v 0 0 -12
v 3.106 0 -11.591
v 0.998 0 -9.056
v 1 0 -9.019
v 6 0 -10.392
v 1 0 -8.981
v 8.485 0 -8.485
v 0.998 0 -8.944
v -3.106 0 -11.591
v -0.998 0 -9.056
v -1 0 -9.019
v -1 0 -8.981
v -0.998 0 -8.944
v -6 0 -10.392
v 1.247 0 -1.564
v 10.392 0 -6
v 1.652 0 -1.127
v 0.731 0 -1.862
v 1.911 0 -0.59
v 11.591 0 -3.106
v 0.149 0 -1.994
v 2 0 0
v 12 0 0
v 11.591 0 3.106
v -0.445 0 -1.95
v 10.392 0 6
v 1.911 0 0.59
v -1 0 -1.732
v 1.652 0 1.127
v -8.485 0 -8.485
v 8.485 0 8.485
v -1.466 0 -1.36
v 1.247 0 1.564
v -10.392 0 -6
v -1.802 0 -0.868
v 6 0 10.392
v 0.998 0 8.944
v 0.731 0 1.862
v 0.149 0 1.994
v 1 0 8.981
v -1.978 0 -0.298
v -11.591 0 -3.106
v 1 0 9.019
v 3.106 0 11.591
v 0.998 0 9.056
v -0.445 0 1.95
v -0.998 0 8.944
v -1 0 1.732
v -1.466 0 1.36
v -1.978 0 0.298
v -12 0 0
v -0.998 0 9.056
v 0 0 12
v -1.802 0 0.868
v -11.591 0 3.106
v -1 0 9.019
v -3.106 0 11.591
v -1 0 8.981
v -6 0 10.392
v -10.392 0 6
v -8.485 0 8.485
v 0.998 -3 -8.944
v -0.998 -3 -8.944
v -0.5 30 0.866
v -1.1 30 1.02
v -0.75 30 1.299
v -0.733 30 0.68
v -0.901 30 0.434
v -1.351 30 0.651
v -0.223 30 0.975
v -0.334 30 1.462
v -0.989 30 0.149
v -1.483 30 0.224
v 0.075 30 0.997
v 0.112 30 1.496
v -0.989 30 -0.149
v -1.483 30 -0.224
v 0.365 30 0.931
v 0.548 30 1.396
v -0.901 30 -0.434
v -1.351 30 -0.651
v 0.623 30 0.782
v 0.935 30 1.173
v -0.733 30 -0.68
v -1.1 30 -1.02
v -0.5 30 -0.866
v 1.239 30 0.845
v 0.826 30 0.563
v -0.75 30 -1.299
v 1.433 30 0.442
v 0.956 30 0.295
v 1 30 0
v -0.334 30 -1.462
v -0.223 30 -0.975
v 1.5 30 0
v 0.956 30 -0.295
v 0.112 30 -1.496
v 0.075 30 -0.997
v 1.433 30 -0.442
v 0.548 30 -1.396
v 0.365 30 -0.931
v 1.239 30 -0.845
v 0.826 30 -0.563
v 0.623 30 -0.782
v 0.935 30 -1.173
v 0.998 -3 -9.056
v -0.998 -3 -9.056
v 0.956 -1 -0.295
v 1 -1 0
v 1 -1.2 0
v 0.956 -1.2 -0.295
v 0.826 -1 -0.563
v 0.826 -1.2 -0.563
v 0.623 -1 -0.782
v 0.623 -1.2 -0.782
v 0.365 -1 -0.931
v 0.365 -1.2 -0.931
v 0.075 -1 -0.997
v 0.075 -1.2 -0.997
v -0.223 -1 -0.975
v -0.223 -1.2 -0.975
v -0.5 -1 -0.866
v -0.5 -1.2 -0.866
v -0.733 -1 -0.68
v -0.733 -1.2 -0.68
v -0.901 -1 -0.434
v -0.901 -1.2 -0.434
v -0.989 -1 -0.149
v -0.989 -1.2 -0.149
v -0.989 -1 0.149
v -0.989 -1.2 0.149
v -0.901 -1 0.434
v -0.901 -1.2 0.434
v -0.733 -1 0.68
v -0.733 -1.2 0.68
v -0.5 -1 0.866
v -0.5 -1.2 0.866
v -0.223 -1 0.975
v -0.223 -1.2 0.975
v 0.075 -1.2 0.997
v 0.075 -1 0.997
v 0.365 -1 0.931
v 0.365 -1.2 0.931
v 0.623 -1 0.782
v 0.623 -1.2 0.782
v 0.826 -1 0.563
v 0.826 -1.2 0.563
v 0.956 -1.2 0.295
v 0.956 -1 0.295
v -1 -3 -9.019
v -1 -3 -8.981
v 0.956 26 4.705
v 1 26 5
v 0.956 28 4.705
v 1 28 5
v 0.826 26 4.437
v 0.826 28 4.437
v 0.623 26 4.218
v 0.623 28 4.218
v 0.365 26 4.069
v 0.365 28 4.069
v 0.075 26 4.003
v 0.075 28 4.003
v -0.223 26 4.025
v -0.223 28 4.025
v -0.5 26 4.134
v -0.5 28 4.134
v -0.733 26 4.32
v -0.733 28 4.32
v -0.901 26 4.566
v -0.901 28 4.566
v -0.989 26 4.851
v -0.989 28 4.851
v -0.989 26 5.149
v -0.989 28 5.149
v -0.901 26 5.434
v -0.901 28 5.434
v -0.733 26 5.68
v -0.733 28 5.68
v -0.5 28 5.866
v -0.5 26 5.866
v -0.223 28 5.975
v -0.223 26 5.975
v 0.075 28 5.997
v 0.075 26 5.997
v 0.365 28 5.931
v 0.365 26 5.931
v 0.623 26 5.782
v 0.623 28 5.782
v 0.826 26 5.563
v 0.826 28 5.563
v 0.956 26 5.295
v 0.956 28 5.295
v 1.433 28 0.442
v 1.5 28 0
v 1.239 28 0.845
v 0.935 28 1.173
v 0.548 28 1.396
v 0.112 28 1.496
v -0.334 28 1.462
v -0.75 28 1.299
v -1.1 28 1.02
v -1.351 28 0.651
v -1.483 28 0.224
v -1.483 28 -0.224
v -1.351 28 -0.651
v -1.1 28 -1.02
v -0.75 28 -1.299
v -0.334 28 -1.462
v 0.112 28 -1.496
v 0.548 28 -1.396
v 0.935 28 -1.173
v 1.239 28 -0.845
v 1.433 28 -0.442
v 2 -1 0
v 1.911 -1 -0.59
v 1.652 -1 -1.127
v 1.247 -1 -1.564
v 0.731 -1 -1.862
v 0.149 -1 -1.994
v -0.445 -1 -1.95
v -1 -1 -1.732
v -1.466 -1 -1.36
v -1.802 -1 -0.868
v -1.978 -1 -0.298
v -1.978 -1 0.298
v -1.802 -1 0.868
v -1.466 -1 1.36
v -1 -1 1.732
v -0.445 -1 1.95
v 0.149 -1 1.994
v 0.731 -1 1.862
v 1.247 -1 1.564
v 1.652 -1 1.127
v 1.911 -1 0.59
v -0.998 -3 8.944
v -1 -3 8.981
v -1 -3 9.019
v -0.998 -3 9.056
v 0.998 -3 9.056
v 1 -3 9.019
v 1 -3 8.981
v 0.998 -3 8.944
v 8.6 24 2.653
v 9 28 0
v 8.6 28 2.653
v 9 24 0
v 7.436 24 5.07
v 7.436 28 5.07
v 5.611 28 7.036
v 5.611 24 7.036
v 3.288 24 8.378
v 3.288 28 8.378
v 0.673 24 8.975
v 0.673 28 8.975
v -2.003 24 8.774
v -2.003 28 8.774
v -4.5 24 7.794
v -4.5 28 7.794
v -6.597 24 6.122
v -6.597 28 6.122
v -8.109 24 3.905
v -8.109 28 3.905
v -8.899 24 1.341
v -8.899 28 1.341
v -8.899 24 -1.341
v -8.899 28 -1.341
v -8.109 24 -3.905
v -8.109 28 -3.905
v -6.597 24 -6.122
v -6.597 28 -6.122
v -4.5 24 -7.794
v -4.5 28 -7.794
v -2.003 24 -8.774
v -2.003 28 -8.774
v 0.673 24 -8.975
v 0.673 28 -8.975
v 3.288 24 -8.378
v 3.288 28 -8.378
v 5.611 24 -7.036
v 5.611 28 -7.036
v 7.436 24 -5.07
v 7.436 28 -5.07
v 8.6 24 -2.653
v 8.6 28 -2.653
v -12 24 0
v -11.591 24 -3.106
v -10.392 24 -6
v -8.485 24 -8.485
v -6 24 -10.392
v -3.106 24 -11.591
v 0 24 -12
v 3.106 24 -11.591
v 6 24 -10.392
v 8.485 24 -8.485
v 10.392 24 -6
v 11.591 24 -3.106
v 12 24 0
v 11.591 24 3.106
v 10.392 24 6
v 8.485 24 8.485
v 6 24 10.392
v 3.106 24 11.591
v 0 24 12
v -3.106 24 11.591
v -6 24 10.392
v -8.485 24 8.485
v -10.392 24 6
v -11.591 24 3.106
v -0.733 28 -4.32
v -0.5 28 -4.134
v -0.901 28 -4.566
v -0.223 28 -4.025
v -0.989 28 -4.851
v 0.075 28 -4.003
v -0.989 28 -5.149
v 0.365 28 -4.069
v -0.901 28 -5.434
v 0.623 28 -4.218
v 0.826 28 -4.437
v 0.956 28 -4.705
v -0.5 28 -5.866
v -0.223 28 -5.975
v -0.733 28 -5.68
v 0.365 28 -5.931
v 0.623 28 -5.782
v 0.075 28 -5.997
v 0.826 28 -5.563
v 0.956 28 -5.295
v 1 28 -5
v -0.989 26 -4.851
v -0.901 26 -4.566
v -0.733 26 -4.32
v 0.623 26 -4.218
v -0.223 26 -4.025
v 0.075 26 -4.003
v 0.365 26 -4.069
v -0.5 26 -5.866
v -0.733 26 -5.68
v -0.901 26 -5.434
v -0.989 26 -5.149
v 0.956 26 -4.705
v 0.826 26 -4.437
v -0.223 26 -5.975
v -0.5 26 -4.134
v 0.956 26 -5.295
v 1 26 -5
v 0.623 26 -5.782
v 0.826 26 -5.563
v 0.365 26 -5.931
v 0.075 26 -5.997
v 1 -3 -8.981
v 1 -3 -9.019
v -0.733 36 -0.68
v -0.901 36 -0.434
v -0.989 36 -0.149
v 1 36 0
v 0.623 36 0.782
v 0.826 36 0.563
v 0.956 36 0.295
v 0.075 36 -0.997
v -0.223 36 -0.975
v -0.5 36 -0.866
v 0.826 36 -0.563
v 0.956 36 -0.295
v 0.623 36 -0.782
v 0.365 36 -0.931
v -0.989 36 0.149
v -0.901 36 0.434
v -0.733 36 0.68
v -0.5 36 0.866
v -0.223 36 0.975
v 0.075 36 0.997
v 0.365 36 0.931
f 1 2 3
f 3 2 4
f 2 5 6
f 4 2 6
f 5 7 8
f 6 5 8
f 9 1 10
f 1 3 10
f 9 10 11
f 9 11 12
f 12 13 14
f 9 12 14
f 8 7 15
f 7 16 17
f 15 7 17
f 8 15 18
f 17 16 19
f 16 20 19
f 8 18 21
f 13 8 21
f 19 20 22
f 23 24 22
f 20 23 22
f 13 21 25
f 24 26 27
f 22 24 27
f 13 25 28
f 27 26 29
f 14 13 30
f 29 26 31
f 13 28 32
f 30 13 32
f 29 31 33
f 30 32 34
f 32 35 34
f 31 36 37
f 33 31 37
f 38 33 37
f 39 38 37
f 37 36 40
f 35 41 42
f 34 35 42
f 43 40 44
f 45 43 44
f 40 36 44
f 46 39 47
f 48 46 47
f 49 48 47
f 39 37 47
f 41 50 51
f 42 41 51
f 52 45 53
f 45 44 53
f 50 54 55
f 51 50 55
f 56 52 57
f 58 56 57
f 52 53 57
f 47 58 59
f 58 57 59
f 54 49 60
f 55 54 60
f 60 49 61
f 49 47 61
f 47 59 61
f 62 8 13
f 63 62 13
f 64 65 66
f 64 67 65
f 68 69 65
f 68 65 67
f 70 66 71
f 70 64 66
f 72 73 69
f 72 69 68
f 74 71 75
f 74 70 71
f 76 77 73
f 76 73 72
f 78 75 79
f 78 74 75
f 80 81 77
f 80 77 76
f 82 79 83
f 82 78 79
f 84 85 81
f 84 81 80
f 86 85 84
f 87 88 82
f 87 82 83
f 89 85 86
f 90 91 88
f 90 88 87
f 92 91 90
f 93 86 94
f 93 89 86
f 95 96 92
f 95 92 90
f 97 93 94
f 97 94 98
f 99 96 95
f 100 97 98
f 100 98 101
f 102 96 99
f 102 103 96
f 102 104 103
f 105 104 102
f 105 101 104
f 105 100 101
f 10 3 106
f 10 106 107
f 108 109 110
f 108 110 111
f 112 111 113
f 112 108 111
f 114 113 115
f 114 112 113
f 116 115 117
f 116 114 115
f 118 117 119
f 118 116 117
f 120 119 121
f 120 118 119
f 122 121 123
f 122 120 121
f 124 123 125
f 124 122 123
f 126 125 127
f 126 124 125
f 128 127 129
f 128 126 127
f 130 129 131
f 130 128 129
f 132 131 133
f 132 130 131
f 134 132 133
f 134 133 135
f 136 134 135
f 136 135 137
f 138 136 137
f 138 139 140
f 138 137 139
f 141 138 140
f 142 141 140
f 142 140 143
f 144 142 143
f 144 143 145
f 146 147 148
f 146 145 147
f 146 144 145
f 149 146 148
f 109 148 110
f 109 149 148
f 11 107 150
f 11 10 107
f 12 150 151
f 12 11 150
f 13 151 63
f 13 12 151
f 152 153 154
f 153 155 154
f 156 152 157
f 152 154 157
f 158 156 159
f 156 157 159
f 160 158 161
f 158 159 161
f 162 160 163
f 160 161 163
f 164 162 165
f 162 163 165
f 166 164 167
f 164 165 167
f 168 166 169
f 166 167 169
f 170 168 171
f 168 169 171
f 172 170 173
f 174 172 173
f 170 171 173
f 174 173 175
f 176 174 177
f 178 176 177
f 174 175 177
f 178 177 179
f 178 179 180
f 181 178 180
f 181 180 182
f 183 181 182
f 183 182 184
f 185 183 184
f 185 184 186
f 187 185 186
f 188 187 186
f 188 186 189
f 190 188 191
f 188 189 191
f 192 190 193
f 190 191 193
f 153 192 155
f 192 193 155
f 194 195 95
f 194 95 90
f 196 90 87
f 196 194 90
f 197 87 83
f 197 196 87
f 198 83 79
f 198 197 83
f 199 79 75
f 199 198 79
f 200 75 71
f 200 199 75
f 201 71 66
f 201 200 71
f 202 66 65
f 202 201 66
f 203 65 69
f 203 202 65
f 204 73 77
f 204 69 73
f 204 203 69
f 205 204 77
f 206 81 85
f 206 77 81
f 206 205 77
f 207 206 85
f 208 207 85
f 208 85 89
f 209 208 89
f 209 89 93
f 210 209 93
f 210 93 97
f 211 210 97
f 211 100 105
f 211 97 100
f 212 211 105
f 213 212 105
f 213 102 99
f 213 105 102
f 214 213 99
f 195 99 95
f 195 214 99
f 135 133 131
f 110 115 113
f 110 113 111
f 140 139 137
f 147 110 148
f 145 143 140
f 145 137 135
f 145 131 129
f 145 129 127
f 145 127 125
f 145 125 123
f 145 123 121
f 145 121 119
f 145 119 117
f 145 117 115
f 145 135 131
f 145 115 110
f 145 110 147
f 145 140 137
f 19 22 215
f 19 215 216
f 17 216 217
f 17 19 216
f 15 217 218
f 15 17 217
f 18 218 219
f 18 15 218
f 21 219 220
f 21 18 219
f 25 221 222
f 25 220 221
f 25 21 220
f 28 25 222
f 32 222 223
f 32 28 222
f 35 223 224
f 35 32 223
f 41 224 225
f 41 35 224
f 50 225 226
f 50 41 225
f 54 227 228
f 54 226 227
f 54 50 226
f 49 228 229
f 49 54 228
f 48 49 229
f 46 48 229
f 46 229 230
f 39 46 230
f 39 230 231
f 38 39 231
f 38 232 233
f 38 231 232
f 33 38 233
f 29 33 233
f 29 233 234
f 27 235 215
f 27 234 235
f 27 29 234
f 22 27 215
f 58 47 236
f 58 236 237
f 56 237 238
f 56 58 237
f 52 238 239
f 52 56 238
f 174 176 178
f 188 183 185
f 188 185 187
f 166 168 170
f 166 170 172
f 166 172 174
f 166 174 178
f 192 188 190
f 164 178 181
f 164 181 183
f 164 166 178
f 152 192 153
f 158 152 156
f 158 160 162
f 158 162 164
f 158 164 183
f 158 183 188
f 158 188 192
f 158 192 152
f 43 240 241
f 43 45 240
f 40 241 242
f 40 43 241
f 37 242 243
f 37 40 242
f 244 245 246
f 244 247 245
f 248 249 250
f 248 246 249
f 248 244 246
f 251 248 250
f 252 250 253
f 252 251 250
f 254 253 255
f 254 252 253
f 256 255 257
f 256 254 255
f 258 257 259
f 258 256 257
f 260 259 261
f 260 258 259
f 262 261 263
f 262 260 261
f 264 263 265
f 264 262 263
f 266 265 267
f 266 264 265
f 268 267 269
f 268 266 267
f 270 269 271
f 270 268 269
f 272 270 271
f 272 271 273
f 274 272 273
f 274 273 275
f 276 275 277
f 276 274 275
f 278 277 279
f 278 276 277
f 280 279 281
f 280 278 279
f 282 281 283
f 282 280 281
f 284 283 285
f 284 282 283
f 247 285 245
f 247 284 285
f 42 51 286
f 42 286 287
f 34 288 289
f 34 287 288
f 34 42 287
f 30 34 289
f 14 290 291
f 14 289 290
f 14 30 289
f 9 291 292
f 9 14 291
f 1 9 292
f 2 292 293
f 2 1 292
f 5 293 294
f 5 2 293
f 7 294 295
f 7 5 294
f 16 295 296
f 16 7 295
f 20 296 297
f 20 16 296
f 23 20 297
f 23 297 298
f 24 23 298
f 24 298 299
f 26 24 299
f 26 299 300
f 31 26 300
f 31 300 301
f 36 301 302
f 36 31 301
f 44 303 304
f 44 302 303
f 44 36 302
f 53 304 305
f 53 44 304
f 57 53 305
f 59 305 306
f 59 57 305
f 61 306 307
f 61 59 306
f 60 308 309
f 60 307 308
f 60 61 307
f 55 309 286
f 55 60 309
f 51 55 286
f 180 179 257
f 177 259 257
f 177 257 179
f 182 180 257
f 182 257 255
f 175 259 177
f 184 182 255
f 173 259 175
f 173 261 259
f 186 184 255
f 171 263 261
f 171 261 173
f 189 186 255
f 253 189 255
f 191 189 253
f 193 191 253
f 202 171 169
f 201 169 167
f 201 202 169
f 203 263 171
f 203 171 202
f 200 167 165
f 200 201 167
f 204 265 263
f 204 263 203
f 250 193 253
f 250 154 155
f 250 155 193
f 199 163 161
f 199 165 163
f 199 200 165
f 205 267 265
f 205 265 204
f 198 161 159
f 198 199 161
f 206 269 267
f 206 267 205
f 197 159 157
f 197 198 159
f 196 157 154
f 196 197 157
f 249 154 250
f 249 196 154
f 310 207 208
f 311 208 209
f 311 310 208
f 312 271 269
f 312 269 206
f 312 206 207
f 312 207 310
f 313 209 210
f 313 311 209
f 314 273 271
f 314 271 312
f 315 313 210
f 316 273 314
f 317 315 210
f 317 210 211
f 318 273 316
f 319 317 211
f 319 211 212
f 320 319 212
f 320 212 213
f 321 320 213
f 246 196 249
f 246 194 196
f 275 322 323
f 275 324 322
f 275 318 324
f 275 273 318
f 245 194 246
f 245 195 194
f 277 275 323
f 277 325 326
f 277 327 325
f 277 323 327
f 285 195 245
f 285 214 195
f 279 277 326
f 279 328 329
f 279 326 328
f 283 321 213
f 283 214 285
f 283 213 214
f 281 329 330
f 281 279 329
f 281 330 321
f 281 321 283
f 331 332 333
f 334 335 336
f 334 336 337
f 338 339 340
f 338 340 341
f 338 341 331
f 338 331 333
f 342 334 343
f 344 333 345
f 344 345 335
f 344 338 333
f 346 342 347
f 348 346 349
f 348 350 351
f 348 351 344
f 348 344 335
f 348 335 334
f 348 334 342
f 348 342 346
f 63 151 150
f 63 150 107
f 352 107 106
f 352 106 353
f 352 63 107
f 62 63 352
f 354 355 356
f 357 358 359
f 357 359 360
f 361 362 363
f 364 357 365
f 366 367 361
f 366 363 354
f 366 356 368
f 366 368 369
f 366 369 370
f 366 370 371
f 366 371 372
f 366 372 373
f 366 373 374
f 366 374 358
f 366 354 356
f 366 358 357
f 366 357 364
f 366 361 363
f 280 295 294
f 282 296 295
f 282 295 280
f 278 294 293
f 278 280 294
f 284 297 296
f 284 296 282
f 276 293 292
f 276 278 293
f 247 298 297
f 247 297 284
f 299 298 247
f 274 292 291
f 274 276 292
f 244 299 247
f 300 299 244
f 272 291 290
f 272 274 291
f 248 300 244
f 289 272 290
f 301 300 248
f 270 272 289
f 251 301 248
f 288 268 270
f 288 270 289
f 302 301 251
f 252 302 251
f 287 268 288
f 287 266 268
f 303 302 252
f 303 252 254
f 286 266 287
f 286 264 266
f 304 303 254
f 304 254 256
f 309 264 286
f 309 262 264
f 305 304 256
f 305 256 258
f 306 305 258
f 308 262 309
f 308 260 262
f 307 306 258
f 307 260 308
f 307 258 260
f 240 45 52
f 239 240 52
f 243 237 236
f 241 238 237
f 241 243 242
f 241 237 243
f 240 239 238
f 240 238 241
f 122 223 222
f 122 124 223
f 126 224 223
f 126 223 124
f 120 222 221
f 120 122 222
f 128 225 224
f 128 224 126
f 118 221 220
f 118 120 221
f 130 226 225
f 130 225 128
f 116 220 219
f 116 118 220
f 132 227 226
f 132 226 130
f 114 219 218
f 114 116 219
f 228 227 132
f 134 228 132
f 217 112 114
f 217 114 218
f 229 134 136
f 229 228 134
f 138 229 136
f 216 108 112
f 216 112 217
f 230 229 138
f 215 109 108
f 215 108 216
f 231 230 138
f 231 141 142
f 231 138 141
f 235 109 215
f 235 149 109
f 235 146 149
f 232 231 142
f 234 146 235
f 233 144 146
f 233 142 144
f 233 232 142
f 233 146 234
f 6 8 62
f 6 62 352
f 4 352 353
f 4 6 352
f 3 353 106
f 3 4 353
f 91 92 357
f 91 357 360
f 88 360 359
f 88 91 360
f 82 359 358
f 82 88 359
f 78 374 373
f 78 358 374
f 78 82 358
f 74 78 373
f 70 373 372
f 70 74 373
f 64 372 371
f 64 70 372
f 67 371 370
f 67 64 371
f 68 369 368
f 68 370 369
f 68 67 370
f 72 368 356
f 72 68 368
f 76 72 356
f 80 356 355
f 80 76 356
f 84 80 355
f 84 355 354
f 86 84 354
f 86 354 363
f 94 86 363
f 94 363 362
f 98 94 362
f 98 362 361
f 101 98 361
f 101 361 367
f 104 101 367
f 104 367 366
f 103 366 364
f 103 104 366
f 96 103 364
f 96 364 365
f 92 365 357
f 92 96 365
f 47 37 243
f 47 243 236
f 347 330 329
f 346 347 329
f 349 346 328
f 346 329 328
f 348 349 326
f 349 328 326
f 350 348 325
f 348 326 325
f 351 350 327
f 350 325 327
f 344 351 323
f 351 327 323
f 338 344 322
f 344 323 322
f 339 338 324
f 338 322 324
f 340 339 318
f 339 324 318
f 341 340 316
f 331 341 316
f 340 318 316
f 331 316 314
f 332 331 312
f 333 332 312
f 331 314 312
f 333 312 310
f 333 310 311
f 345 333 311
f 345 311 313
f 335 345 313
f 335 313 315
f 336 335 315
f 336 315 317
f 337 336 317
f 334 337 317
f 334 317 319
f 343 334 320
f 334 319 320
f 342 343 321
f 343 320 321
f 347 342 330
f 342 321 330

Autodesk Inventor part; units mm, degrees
ref_plane "YZ Plane" through (0, 0, 0) normal (1, 0, 0) x (0, 1, 0)
ref_plane "XZ Plane" through (0, 0, 0) normal (0, 1, 0) x (-1, 0, 0)
ref_plane "XY Plane" through (0, 0, 0) normal (0, 0, 1) x (1, 0, 0)
sketch "Sketch1" plane through (0, 0, 0) normal (0, 1, 0) x (-1, 0, 0)
  circle A0 centre (0, 0) radius 12
  dimension "d0" = 24
extrude "Extrusion1" add sketch "Sketch1" along normal blind 24
sketch "Sketch2" plane through (0, 24, 0) normal (0, 1, 0) x (1, 0, 0)
  circle A0 centre (0, 0) radius 9
  dimension "d3" = 18
extrude "Extrusion2" add sketch "Sketch2" along normal blind 4
sketch "Sketch3" plane through (0, 28, 0) normal (0, 1, 0) x (1, 0, 0)
  circle A0 centre (0, 0) radius 1
  circle A1 centre (0, 0) radius 1.5
  dimension "d6" = 2
  dimension "d7" = 3
extrude "Extrusion3" add sketch "Sketch3" along normal blind 2
sketch "Sketch4" plane through (0, 28, 0) normal (0, 1, 0) x (1, 0, 0)
  circle A0 centre (0, 0) radius 1
extrude "Extrusion4" add sketch "Sketch4" along normal blind 8
sketch "Sketch5" plane through (0, 0, 0) normal (0, -1, 0) x (1, 0, 0)
  circle A0 centre (0, 0) radius 9 projected
  circle A1 centre (0, 9) radius 1
  circle A2 centre (0, -9) radius 1
  line L0 (0.9985, 8.9444) -> (-0.9985, 8.9444)
  line L1 (0.9985, 9.0556) -> (-0.9985, 9.0556)
  line L2 (0.9985, -8.9444) -> (-0.9985, -8.9444)
  line L3 (0.9985, -9.0556) -> (-0.9985, -9.0556)
  dimension "d12" = 2
  dimension "d13" = 2
extrude "Extrusion5" add sketch "Sketch5" along normal blind 3 contours L0 A0 | A0 A1 L1 | A2 L3 A0 | A0 L2
sketch "Sketch6" plane through (0, 0, 0) normal (0, -1, 0) x (1, 0, 0)
  circle A0 centre (0, 0) radius 1.5 projected
  circle A1 centre (0, 0) radius 2
  dimension "d16" = 4
extrude "Extrusion6" add sketch "Sketch6" along normal blind 1 contours A0 | A1
sketch "Sketch7" plane through (0, -1, 0) normal (0, -1, 0) x (1, 0, 0)
  circle A0 centre (0, 0) radius 1
  dimension "d19" = 2
extrude "Extrusion7" add sketch "Sketch7" along normal blind 0.2
sketch "Sketch8" plane through (0, 28, 0) normal (0, 1, 0) x (1, 0, 0)
  circle A0 centre (0, 5) radius 1
  circle A1 centre (0, -5) radius 1
  point P0 (0, 0)
  dimension "d22" = 2
  dimension "d23" = 2
extrude "Extrusion8" cut sketch "Sketch8" against normal blind 2
sketch "Sketch9" plane through (0.9985, 0, -9.0556) normal (0, 0, -1) x (-1, 0, 0)
  point P0 (0.9985, 0)
equation "\"BendRadius\" = Thickness"
equation "\"BendReliefWidth\" = Thickness"
equation "\"BendReliefDepth\" = 0.5 * Thickness"
equation "\"CornerReliefSize\" = 4 * Thickness"
equation "\"MinimumRemnant\" = 2 * Thickness"
equation "\"TransitionRadius\" = BendRadius"
equation "\"JacobiRadiusSize\" = BendRadius"
equation "\"GapSize\" = Thickness"
equation "\"Thickness\" = 0.5"
